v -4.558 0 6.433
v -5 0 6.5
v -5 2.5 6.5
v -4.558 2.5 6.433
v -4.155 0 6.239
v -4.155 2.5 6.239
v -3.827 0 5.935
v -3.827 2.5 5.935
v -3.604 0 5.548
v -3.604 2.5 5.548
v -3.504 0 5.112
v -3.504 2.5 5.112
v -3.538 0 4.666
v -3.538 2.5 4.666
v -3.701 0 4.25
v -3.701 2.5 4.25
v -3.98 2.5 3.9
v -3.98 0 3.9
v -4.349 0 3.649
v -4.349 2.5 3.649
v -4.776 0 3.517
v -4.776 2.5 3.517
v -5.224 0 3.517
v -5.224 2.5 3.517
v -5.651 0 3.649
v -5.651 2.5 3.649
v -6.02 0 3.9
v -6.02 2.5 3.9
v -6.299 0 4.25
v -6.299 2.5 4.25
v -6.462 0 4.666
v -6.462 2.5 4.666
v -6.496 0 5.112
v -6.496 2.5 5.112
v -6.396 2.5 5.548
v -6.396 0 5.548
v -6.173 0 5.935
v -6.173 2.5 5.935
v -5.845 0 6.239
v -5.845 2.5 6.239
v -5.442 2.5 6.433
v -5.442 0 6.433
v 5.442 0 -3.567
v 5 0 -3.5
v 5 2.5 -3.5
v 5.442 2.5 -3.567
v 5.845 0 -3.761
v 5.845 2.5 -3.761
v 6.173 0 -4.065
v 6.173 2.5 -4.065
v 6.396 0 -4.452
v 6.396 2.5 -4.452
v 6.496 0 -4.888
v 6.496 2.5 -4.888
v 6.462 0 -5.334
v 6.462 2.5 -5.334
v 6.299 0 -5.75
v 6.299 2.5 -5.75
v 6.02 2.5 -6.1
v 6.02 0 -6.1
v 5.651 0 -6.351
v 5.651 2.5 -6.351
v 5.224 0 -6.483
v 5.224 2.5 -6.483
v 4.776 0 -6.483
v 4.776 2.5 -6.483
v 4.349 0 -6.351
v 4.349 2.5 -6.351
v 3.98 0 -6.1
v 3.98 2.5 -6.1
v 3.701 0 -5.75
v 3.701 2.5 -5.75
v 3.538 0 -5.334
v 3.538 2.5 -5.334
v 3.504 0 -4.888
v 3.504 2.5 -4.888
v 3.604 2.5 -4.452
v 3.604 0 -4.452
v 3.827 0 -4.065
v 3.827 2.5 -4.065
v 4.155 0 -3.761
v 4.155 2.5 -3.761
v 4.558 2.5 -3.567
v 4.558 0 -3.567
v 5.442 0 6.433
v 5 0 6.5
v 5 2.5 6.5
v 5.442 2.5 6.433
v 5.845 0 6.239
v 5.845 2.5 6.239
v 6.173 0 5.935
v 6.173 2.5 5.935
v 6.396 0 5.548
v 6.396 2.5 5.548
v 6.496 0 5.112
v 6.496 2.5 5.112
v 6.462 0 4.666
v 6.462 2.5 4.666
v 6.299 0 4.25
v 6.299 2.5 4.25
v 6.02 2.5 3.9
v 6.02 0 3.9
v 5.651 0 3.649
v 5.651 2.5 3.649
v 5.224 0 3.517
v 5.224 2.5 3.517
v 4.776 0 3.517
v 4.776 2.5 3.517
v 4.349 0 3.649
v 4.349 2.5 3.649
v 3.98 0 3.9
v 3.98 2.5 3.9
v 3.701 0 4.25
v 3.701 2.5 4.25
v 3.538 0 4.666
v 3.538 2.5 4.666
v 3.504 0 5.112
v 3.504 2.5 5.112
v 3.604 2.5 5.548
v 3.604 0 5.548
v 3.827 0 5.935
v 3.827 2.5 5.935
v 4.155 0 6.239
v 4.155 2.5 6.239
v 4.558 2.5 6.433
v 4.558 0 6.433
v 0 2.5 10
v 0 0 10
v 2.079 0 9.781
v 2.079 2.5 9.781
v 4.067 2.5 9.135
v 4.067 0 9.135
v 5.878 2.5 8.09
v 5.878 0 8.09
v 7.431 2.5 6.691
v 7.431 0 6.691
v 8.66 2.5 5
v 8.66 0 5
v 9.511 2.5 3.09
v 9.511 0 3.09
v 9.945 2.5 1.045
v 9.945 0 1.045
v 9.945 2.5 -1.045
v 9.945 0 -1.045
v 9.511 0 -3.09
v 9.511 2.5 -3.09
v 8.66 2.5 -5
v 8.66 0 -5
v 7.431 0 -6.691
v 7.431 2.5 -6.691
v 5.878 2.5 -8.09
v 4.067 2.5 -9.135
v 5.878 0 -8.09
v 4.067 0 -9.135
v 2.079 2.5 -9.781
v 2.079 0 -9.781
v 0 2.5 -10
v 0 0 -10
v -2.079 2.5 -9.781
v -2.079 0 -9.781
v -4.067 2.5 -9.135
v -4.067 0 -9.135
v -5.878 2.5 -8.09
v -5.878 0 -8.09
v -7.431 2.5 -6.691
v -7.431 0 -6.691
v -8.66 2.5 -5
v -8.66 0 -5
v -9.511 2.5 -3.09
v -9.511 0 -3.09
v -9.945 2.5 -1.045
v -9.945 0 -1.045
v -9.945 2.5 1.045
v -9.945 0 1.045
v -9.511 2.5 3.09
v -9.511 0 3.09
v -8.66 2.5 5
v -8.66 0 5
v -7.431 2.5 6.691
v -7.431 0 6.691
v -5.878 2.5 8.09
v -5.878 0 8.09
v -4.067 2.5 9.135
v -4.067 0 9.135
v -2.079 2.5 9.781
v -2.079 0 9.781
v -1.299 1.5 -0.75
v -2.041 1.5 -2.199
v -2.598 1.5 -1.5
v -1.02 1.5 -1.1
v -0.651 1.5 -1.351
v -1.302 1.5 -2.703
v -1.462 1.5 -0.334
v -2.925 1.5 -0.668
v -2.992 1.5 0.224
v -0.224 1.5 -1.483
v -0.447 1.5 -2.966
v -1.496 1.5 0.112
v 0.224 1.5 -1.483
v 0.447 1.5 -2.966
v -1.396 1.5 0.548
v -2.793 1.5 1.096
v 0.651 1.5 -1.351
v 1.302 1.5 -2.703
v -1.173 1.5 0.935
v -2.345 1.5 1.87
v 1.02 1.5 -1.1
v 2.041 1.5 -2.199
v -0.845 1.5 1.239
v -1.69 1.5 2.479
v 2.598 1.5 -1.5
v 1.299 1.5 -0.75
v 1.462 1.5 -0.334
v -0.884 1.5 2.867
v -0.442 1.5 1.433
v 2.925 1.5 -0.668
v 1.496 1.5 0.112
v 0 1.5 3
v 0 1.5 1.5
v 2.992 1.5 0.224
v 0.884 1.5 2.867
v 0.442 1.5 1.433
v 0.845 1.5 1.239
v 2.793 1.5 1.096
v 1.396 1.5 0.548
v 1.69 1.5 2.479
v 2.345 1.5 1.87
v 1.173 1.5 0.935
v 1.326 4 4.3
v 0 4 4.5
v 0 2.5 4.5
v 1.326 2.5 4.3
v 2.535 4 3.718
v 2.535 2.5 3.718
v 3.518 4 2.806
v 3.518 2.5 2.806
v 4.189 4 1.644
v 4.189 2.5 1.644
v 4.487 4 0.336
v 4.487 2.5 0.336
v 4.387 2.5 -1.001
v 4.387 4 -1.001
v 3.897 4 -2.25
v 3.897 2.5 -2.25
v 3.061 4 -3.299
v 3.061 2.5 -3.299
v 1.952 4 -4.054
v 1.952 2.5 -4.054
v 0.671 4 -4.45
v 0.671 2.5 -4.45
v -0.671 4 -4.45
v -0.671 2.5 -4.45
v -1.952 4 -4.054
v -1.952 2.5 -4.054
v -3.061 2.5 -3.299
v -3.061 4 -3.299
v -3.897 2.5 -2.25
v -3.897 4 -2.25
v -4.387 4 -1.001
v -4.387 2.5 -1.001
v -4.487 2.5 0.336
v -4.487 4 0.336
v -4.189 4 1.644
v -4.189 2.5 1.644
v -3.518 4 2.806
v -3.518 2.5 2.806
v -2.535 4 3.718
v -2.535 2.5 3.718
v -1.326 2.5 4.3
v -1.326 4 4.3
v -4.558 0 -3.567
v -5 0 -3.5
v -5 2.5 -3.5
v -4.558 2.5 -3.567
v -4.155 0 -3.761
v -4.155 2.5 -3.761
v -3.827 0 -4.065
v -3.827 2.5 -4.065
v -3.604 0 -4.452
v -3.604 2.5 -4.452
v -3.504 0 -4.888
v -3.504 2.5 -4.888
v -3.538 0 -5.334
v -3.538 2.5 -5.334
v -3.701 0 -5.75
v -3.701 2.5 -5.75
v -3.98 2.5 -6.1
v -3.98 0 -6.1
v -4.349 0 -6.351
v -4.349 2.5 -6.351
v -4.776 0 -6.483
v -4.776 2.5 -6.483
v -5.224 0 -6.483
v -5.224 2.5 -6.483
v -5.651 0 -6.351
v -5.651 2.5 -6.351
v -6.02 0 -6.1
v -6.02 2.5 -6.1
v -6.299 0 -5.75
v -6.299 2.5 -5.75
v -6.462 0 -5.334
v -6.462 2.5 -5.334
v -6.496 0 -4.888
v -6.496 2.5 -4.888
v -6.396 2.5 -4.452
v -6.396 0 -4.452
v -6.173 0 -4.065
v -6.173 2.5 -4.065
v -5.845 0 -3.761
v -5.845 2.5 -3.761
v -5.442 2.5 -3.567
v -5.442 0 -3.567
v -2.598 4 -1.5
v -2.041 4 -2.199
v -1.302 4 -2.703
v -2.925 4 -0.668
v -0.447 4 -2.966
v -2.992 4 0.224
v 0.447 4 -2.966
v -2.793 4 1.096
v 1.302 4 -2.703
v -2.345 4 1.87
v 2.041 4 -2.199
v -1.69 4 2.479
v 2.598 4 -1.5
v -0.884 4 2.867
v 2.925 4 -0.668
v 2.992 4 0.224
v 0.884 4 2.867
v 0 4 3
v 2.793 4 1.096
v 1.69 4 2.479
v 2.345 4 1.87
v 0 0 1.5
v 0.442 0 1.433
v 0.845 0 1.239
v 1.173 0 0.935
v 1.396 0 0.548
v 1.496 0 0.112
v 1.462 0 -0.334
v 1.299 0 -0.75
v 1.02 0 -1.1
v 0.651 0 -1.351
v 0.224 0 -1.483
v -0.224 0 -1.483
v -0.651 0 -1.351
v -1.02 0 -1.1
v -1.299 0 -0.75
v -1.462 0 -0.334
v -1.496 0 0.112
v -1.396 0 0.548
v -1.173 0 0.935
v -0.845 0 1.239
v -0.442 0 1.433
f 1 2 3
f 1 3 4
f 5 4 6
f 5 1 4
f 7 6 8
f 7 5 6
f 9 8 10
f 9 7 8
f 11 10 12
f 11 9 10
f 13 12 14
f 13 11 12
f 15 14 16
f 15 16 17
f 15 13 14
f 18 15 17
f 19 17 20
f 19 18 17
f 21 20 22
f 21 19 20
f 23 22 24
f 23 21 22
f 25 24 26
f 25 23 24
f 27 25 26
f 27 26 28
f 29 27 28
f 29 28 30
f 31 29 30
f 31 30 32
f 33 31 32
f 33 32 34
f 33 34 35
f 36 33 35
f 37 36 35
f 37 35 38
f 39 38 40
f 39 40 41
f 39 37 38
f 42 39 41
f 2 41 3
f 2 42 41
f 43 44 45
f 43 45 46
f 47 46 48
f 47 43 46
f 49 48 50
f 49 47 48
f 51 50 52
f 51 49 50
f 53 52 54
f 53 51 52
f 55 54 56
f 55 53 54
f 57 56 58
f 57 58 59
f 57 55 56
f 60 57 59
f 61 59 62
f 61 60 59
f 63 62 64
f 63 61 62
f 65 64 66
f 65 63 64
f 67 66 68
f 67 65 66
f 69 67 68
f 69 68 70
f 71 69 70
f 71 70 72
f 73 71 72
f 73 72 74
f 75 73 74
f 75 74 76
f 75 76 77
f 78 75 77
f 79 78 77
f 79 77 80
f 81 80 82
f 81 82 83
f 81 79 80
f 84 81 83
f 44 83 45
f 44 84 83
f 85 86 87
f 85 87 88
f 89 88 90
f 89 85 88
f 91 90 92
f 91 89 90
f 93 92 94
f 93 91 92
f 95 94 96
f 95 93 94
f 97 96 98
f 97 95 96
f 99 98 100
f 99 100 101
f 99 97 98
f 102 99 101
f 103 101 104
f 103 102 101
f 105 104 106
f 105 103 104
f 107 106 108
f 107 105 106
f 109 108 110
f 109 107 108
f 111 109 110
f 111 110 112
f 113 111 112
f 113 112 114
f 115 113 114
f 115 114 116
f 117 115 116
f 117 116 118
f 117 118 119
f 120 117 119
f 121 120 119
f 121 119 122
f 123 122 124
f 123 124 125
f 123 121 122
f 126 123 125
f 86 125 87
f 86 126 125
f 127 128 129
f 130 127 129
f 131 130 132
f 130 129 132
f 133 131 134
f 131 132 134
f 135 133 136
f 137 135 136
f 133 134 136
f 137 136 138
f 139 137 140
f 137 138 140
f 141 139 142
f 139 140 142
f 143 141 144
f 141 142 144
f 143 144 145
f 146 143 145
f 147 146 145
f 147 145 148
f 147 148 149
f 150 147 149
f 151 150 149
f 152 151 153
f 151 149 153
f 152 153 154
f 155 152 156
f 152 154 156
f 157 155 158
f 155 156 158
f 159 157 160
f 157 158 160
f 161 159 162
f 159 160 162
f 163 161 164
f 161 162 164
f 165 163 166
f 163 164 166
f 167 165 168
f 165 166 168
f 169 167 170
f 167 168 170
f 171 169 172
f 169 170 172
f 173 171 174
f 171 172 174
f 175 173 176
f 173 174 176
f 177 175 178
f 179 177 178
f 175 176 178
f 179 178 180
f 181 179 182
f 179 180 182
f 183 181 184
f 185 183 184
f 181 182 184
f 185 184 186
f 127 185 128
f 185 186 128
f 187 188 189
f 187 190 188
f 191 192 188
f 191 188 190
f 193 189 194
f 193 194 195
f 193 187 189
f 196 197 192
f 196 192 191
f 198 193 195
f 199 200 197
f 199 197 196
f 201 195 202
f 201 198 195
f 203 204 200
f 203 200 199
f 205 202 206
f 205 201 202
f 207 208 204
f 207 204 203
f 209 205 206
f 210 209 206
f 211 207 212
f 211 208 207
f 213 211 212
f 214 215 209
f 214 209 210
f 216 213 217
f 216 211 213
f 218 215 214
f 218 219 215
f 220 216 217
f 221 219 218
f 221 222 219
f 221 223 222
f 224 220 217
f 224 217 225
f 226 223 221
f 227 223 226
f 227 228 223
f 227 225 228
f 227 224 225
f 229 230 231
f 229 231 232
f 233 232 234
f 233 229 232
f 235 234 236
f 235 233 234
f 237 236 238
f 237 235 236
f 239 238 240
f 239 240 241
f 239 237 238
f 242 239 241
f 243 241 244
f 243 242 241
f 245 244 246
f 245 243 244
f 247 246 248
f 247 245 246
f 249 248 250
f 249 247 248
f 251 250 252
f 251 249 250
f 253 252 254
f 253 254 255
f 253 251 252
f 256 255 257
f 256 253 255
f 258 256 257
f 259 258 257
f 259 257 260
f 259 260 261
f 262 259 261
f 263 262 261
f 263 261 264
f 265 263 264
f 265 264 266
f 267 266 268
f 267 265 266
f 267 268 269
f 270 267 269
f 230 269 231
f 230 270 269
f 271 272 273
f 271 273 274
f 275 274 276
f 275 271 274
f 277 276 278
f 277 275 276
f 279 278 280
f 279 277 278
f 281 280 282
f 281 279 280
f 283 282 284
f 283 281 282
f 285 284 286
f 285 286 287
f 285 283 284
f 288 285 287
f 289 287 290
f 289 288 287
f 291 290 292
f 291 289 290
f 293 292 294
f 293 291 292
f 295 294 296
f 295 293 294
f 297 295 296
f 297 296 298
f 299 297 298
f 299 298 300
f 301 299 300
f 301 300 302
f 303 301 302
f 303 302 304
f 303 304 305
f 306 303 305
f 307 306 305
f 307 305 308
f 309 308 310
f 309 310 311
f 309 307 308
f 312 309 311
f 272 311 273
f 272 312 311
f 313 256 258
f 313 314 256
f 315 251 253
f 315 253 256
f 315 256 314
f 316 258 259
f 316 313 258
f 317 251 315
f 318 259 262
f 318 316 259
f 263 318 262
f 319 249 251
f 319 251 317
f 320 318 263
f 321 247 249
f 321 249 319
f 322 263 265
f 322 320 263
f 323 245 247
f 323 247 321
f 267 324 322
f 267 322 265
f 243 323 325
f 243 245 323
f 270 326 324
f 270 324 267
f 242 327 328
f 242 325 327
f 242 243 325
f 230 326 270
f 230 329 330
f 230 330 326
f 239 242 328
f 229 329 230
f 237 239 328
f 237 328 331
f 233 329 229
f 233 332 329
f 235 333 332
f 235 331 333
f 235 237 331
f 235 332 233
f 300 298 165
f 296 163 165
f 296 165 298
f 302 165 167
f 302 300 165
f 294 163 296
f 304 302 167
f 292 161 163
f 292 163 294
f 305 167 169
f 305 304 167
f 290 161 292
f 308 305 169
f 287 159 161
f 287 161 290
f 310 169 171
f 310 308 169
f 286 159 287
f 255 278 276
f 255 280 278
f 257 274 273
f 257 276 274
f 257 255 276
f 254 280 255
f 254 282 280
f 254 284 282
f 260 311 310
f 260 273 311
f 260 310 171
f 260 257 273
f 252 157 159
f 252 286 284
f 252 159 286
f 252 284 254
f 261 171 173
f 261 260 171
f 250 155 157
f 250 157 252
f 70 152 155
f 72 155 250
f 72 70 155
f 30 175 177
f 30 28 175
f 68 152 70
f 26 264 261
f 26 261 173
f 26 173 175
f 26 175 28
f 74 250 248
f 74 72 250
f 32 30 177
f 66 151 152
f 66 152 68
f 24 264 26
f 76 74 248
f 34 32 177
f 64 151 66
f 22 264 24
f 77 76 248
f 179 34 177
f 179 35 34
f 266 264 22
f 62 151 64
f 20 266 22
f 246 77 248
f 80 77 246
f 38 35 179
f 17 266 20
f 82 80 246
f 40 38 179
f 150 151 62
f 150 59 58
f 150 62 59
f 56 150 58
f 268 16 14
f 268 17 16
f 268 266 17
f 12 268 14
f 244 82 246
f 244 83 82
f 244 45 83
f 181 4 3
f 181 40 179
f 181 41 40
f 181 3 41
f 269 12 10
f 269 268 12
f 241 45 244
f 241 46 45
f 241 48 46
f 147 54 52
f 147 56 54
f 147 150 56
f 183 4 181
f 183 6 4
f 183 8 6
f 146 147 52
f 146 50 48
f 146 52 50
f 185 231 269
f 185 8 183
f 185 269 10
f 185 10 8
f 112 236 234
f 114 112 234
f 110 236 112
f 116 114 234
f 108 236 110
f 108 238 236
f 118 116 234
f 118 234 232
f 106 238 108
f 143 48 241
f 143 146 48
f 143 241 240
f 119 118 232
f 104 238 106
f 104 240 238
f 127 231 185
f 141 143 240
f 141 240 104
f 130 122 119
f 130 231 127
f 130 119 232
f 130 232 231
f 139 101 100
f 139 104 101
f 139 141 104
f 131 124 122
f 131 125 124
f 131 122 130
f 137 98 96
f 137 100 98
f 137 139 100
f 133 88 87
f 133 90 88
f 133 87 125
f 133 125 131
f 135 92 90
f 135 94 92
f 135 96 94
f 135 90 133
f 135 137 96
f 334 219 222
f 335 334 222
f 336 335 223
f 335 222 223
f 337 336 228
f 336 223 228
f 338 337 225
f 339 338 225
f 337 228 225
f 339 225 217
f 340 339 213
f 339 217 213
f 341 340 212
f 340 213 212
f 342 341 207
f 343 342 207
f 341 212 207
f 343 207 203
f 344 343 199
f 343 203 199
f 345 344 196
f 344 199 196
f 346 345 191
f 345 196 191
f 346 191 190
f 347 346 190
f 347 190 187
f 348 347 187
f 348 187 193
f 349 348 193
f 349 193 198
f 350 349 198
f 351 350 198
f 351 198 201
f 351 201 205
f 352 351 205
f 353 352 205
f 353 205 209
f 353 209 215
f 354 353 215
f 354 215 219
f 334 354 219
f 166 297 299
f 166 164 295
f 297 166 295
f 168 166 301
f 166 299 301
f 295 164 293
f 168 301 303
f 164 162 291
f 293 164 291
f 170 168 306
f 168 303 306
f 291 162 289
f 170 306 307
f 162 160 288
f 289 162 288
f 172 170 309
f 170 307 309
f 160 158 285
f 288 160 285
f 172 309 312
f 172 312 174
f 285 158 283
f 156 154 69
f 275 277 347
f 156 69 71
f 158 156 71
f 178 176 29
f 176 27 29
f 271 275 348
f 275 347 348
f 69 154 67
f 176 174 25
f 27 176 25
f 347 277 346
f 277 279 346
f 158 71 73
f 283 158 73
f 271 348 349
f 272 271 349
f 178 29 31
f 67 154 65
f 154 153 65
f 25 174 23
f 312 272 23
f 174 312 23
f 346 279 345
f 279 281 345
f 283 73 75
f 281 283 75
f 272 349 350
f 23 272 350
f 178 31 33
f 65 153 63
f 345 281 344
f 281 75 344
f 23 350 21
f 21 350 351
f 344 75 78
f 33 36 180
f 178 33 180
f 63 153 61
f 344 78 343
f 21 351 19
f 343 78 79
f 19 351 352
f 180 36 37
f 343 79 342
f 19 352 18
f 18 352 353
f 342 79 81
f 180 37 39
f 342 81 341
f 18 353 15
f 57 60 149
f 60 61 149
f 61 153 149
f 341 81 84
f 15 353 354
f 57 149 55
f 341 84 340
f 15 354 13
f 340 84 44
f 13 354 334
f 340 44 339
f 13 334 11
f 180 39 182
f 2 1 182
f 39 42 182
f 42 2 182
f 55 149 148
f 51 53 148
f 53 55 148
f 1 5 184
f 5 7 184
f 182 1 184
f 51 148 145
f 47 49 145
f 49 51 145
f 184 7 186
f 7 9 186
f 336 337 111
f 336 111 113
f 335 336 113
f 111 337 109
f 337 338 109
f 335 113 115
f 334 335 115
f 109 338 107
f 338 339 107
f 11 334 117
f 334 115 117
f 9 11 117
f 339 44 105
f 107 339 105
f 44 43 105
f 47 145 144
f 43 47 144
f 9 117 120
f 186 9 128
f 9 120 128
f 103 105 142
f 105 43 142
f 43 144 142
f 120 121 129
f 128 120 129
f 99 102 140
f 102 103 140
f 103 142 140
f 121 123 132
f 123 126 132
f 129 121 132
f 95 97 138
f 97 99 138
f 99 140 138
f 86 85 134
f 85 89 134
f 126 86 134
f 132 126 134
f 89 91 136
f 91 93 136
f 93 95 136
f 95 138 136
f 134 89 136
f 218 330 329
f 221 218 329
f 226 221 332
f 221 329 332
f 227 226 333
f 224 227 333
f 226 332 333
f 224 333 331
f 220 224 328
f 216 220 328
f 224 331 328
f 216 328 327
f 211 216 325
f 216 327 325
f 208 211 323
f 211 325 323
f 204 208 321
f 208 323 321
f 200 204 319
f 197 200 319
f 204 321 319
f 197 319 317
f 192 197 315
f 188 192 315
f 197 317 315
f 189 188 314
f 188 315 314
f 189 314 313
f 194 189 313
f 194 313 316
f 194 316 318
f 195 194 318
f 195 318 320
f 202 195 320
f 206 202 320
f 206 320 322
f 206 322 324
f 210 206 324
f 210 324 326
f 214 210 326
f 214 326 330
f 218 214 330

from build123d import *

# Parameters (mm, degrees)
SKETCH_1_R          = 10
SKETCH_1_R_2        = 1.5
EXTRUDE_2_DEPTH     = 2.5
SKETCH_2_R          = 3
CUT_EXTRUDE_1_DEPTH = 1
SKETCH_3_R          = 1.5
CUT_EXTRUDE_3_DEPTH = 15.221462653
EXTRUDE_START       = 1.5
SKETCH_4_R          = 4.5
SKETCH_4_R_2        = 3
EXTRUDE_3_DEPTH     = 1.5


with BuildPart() as part:
    # 草图1 → 凸台-拉伸2 (new body)
    with BuildSketch(Plane(origin=(0, 0, 0), x_dir=(1, 0, 0), z_dir=(0, 1, 0))):
        with Locations(Location((0, 0, 0), (0, 0, 270))):
            Circle(SKETCH_1_R)
        with Locations(Location((-5, 5, 0), (0, 0, 270))):
            Circle(SKETCH_1_R_2, mode=Mode.SUBTRACT)
        with Locations(Location((5, 5, 0), (0, 0, 270))):
            Circle(SKETCH_1_R_2, mode=Mode.SUBTRACT)
        with Locations(Location((5, -5, 0), (0, 0, 270))):
            Circle(SKETCH_1_R_2, mode=Mode.SUBTRACT)
        with Locations(Location((-5, -5, 0), (0, 0, 270))):
            Circle(SKETCH_1_R_2, mode=Mode.SUBTRACT)
    extrude(amount=EXTRUDE_2_DEPTH)

    # 草图2 → 切除-拉伸1 (cut)
    with BuildSketch(Plane(origin=(0, 2.5, 0), x_dir=(1, 0, 0), z_dir=(0, 1, 0))):
        with Locations(Location((0, 0, 0), (0, 0, 270))):
            Circle(SKETCH_2_R)
    extrude(amount=-CUT_EXTRUDE_1_DEPTH, mode=Mode.SUBTRACT)

    # 草图3 → 切除-拉伸3 (cut, through all)
    with BuildSketch(Plane(origin=(0, 1.5, 0), x_dir=(1, 0, 0), z_dir=(0, 1, 0))):
        with Locations(Location((0, 0, 0), (0, 0, 270))):
            Circle(SKETCH_3_R)
    extrude(amount=-CUT_EXTRUDE_3_DEPTH, mode=Mode.SUBTRACT)

    # 草图4 → 凸台-拉伸3 (add)
    with BuildSketch(Plane(origin=(0, 2.5, 0), x_dir=(1, 0, 0), z_dir=(0, 1, 0)).offset(EXTRUDE_START)):
        with Locations(Location((0, 0, 0), (0, 0, 270))):
            Circle(SKETCH_4_R)
        with Locations(Location((0, 0, 0), (0, 0, 270))):
            Circle(SKETCH_4_R_2, mode=Mode.SUBTRACT)
    extrude(amount=-EXTRUDE_3_DEPTH)


solid = part.part
